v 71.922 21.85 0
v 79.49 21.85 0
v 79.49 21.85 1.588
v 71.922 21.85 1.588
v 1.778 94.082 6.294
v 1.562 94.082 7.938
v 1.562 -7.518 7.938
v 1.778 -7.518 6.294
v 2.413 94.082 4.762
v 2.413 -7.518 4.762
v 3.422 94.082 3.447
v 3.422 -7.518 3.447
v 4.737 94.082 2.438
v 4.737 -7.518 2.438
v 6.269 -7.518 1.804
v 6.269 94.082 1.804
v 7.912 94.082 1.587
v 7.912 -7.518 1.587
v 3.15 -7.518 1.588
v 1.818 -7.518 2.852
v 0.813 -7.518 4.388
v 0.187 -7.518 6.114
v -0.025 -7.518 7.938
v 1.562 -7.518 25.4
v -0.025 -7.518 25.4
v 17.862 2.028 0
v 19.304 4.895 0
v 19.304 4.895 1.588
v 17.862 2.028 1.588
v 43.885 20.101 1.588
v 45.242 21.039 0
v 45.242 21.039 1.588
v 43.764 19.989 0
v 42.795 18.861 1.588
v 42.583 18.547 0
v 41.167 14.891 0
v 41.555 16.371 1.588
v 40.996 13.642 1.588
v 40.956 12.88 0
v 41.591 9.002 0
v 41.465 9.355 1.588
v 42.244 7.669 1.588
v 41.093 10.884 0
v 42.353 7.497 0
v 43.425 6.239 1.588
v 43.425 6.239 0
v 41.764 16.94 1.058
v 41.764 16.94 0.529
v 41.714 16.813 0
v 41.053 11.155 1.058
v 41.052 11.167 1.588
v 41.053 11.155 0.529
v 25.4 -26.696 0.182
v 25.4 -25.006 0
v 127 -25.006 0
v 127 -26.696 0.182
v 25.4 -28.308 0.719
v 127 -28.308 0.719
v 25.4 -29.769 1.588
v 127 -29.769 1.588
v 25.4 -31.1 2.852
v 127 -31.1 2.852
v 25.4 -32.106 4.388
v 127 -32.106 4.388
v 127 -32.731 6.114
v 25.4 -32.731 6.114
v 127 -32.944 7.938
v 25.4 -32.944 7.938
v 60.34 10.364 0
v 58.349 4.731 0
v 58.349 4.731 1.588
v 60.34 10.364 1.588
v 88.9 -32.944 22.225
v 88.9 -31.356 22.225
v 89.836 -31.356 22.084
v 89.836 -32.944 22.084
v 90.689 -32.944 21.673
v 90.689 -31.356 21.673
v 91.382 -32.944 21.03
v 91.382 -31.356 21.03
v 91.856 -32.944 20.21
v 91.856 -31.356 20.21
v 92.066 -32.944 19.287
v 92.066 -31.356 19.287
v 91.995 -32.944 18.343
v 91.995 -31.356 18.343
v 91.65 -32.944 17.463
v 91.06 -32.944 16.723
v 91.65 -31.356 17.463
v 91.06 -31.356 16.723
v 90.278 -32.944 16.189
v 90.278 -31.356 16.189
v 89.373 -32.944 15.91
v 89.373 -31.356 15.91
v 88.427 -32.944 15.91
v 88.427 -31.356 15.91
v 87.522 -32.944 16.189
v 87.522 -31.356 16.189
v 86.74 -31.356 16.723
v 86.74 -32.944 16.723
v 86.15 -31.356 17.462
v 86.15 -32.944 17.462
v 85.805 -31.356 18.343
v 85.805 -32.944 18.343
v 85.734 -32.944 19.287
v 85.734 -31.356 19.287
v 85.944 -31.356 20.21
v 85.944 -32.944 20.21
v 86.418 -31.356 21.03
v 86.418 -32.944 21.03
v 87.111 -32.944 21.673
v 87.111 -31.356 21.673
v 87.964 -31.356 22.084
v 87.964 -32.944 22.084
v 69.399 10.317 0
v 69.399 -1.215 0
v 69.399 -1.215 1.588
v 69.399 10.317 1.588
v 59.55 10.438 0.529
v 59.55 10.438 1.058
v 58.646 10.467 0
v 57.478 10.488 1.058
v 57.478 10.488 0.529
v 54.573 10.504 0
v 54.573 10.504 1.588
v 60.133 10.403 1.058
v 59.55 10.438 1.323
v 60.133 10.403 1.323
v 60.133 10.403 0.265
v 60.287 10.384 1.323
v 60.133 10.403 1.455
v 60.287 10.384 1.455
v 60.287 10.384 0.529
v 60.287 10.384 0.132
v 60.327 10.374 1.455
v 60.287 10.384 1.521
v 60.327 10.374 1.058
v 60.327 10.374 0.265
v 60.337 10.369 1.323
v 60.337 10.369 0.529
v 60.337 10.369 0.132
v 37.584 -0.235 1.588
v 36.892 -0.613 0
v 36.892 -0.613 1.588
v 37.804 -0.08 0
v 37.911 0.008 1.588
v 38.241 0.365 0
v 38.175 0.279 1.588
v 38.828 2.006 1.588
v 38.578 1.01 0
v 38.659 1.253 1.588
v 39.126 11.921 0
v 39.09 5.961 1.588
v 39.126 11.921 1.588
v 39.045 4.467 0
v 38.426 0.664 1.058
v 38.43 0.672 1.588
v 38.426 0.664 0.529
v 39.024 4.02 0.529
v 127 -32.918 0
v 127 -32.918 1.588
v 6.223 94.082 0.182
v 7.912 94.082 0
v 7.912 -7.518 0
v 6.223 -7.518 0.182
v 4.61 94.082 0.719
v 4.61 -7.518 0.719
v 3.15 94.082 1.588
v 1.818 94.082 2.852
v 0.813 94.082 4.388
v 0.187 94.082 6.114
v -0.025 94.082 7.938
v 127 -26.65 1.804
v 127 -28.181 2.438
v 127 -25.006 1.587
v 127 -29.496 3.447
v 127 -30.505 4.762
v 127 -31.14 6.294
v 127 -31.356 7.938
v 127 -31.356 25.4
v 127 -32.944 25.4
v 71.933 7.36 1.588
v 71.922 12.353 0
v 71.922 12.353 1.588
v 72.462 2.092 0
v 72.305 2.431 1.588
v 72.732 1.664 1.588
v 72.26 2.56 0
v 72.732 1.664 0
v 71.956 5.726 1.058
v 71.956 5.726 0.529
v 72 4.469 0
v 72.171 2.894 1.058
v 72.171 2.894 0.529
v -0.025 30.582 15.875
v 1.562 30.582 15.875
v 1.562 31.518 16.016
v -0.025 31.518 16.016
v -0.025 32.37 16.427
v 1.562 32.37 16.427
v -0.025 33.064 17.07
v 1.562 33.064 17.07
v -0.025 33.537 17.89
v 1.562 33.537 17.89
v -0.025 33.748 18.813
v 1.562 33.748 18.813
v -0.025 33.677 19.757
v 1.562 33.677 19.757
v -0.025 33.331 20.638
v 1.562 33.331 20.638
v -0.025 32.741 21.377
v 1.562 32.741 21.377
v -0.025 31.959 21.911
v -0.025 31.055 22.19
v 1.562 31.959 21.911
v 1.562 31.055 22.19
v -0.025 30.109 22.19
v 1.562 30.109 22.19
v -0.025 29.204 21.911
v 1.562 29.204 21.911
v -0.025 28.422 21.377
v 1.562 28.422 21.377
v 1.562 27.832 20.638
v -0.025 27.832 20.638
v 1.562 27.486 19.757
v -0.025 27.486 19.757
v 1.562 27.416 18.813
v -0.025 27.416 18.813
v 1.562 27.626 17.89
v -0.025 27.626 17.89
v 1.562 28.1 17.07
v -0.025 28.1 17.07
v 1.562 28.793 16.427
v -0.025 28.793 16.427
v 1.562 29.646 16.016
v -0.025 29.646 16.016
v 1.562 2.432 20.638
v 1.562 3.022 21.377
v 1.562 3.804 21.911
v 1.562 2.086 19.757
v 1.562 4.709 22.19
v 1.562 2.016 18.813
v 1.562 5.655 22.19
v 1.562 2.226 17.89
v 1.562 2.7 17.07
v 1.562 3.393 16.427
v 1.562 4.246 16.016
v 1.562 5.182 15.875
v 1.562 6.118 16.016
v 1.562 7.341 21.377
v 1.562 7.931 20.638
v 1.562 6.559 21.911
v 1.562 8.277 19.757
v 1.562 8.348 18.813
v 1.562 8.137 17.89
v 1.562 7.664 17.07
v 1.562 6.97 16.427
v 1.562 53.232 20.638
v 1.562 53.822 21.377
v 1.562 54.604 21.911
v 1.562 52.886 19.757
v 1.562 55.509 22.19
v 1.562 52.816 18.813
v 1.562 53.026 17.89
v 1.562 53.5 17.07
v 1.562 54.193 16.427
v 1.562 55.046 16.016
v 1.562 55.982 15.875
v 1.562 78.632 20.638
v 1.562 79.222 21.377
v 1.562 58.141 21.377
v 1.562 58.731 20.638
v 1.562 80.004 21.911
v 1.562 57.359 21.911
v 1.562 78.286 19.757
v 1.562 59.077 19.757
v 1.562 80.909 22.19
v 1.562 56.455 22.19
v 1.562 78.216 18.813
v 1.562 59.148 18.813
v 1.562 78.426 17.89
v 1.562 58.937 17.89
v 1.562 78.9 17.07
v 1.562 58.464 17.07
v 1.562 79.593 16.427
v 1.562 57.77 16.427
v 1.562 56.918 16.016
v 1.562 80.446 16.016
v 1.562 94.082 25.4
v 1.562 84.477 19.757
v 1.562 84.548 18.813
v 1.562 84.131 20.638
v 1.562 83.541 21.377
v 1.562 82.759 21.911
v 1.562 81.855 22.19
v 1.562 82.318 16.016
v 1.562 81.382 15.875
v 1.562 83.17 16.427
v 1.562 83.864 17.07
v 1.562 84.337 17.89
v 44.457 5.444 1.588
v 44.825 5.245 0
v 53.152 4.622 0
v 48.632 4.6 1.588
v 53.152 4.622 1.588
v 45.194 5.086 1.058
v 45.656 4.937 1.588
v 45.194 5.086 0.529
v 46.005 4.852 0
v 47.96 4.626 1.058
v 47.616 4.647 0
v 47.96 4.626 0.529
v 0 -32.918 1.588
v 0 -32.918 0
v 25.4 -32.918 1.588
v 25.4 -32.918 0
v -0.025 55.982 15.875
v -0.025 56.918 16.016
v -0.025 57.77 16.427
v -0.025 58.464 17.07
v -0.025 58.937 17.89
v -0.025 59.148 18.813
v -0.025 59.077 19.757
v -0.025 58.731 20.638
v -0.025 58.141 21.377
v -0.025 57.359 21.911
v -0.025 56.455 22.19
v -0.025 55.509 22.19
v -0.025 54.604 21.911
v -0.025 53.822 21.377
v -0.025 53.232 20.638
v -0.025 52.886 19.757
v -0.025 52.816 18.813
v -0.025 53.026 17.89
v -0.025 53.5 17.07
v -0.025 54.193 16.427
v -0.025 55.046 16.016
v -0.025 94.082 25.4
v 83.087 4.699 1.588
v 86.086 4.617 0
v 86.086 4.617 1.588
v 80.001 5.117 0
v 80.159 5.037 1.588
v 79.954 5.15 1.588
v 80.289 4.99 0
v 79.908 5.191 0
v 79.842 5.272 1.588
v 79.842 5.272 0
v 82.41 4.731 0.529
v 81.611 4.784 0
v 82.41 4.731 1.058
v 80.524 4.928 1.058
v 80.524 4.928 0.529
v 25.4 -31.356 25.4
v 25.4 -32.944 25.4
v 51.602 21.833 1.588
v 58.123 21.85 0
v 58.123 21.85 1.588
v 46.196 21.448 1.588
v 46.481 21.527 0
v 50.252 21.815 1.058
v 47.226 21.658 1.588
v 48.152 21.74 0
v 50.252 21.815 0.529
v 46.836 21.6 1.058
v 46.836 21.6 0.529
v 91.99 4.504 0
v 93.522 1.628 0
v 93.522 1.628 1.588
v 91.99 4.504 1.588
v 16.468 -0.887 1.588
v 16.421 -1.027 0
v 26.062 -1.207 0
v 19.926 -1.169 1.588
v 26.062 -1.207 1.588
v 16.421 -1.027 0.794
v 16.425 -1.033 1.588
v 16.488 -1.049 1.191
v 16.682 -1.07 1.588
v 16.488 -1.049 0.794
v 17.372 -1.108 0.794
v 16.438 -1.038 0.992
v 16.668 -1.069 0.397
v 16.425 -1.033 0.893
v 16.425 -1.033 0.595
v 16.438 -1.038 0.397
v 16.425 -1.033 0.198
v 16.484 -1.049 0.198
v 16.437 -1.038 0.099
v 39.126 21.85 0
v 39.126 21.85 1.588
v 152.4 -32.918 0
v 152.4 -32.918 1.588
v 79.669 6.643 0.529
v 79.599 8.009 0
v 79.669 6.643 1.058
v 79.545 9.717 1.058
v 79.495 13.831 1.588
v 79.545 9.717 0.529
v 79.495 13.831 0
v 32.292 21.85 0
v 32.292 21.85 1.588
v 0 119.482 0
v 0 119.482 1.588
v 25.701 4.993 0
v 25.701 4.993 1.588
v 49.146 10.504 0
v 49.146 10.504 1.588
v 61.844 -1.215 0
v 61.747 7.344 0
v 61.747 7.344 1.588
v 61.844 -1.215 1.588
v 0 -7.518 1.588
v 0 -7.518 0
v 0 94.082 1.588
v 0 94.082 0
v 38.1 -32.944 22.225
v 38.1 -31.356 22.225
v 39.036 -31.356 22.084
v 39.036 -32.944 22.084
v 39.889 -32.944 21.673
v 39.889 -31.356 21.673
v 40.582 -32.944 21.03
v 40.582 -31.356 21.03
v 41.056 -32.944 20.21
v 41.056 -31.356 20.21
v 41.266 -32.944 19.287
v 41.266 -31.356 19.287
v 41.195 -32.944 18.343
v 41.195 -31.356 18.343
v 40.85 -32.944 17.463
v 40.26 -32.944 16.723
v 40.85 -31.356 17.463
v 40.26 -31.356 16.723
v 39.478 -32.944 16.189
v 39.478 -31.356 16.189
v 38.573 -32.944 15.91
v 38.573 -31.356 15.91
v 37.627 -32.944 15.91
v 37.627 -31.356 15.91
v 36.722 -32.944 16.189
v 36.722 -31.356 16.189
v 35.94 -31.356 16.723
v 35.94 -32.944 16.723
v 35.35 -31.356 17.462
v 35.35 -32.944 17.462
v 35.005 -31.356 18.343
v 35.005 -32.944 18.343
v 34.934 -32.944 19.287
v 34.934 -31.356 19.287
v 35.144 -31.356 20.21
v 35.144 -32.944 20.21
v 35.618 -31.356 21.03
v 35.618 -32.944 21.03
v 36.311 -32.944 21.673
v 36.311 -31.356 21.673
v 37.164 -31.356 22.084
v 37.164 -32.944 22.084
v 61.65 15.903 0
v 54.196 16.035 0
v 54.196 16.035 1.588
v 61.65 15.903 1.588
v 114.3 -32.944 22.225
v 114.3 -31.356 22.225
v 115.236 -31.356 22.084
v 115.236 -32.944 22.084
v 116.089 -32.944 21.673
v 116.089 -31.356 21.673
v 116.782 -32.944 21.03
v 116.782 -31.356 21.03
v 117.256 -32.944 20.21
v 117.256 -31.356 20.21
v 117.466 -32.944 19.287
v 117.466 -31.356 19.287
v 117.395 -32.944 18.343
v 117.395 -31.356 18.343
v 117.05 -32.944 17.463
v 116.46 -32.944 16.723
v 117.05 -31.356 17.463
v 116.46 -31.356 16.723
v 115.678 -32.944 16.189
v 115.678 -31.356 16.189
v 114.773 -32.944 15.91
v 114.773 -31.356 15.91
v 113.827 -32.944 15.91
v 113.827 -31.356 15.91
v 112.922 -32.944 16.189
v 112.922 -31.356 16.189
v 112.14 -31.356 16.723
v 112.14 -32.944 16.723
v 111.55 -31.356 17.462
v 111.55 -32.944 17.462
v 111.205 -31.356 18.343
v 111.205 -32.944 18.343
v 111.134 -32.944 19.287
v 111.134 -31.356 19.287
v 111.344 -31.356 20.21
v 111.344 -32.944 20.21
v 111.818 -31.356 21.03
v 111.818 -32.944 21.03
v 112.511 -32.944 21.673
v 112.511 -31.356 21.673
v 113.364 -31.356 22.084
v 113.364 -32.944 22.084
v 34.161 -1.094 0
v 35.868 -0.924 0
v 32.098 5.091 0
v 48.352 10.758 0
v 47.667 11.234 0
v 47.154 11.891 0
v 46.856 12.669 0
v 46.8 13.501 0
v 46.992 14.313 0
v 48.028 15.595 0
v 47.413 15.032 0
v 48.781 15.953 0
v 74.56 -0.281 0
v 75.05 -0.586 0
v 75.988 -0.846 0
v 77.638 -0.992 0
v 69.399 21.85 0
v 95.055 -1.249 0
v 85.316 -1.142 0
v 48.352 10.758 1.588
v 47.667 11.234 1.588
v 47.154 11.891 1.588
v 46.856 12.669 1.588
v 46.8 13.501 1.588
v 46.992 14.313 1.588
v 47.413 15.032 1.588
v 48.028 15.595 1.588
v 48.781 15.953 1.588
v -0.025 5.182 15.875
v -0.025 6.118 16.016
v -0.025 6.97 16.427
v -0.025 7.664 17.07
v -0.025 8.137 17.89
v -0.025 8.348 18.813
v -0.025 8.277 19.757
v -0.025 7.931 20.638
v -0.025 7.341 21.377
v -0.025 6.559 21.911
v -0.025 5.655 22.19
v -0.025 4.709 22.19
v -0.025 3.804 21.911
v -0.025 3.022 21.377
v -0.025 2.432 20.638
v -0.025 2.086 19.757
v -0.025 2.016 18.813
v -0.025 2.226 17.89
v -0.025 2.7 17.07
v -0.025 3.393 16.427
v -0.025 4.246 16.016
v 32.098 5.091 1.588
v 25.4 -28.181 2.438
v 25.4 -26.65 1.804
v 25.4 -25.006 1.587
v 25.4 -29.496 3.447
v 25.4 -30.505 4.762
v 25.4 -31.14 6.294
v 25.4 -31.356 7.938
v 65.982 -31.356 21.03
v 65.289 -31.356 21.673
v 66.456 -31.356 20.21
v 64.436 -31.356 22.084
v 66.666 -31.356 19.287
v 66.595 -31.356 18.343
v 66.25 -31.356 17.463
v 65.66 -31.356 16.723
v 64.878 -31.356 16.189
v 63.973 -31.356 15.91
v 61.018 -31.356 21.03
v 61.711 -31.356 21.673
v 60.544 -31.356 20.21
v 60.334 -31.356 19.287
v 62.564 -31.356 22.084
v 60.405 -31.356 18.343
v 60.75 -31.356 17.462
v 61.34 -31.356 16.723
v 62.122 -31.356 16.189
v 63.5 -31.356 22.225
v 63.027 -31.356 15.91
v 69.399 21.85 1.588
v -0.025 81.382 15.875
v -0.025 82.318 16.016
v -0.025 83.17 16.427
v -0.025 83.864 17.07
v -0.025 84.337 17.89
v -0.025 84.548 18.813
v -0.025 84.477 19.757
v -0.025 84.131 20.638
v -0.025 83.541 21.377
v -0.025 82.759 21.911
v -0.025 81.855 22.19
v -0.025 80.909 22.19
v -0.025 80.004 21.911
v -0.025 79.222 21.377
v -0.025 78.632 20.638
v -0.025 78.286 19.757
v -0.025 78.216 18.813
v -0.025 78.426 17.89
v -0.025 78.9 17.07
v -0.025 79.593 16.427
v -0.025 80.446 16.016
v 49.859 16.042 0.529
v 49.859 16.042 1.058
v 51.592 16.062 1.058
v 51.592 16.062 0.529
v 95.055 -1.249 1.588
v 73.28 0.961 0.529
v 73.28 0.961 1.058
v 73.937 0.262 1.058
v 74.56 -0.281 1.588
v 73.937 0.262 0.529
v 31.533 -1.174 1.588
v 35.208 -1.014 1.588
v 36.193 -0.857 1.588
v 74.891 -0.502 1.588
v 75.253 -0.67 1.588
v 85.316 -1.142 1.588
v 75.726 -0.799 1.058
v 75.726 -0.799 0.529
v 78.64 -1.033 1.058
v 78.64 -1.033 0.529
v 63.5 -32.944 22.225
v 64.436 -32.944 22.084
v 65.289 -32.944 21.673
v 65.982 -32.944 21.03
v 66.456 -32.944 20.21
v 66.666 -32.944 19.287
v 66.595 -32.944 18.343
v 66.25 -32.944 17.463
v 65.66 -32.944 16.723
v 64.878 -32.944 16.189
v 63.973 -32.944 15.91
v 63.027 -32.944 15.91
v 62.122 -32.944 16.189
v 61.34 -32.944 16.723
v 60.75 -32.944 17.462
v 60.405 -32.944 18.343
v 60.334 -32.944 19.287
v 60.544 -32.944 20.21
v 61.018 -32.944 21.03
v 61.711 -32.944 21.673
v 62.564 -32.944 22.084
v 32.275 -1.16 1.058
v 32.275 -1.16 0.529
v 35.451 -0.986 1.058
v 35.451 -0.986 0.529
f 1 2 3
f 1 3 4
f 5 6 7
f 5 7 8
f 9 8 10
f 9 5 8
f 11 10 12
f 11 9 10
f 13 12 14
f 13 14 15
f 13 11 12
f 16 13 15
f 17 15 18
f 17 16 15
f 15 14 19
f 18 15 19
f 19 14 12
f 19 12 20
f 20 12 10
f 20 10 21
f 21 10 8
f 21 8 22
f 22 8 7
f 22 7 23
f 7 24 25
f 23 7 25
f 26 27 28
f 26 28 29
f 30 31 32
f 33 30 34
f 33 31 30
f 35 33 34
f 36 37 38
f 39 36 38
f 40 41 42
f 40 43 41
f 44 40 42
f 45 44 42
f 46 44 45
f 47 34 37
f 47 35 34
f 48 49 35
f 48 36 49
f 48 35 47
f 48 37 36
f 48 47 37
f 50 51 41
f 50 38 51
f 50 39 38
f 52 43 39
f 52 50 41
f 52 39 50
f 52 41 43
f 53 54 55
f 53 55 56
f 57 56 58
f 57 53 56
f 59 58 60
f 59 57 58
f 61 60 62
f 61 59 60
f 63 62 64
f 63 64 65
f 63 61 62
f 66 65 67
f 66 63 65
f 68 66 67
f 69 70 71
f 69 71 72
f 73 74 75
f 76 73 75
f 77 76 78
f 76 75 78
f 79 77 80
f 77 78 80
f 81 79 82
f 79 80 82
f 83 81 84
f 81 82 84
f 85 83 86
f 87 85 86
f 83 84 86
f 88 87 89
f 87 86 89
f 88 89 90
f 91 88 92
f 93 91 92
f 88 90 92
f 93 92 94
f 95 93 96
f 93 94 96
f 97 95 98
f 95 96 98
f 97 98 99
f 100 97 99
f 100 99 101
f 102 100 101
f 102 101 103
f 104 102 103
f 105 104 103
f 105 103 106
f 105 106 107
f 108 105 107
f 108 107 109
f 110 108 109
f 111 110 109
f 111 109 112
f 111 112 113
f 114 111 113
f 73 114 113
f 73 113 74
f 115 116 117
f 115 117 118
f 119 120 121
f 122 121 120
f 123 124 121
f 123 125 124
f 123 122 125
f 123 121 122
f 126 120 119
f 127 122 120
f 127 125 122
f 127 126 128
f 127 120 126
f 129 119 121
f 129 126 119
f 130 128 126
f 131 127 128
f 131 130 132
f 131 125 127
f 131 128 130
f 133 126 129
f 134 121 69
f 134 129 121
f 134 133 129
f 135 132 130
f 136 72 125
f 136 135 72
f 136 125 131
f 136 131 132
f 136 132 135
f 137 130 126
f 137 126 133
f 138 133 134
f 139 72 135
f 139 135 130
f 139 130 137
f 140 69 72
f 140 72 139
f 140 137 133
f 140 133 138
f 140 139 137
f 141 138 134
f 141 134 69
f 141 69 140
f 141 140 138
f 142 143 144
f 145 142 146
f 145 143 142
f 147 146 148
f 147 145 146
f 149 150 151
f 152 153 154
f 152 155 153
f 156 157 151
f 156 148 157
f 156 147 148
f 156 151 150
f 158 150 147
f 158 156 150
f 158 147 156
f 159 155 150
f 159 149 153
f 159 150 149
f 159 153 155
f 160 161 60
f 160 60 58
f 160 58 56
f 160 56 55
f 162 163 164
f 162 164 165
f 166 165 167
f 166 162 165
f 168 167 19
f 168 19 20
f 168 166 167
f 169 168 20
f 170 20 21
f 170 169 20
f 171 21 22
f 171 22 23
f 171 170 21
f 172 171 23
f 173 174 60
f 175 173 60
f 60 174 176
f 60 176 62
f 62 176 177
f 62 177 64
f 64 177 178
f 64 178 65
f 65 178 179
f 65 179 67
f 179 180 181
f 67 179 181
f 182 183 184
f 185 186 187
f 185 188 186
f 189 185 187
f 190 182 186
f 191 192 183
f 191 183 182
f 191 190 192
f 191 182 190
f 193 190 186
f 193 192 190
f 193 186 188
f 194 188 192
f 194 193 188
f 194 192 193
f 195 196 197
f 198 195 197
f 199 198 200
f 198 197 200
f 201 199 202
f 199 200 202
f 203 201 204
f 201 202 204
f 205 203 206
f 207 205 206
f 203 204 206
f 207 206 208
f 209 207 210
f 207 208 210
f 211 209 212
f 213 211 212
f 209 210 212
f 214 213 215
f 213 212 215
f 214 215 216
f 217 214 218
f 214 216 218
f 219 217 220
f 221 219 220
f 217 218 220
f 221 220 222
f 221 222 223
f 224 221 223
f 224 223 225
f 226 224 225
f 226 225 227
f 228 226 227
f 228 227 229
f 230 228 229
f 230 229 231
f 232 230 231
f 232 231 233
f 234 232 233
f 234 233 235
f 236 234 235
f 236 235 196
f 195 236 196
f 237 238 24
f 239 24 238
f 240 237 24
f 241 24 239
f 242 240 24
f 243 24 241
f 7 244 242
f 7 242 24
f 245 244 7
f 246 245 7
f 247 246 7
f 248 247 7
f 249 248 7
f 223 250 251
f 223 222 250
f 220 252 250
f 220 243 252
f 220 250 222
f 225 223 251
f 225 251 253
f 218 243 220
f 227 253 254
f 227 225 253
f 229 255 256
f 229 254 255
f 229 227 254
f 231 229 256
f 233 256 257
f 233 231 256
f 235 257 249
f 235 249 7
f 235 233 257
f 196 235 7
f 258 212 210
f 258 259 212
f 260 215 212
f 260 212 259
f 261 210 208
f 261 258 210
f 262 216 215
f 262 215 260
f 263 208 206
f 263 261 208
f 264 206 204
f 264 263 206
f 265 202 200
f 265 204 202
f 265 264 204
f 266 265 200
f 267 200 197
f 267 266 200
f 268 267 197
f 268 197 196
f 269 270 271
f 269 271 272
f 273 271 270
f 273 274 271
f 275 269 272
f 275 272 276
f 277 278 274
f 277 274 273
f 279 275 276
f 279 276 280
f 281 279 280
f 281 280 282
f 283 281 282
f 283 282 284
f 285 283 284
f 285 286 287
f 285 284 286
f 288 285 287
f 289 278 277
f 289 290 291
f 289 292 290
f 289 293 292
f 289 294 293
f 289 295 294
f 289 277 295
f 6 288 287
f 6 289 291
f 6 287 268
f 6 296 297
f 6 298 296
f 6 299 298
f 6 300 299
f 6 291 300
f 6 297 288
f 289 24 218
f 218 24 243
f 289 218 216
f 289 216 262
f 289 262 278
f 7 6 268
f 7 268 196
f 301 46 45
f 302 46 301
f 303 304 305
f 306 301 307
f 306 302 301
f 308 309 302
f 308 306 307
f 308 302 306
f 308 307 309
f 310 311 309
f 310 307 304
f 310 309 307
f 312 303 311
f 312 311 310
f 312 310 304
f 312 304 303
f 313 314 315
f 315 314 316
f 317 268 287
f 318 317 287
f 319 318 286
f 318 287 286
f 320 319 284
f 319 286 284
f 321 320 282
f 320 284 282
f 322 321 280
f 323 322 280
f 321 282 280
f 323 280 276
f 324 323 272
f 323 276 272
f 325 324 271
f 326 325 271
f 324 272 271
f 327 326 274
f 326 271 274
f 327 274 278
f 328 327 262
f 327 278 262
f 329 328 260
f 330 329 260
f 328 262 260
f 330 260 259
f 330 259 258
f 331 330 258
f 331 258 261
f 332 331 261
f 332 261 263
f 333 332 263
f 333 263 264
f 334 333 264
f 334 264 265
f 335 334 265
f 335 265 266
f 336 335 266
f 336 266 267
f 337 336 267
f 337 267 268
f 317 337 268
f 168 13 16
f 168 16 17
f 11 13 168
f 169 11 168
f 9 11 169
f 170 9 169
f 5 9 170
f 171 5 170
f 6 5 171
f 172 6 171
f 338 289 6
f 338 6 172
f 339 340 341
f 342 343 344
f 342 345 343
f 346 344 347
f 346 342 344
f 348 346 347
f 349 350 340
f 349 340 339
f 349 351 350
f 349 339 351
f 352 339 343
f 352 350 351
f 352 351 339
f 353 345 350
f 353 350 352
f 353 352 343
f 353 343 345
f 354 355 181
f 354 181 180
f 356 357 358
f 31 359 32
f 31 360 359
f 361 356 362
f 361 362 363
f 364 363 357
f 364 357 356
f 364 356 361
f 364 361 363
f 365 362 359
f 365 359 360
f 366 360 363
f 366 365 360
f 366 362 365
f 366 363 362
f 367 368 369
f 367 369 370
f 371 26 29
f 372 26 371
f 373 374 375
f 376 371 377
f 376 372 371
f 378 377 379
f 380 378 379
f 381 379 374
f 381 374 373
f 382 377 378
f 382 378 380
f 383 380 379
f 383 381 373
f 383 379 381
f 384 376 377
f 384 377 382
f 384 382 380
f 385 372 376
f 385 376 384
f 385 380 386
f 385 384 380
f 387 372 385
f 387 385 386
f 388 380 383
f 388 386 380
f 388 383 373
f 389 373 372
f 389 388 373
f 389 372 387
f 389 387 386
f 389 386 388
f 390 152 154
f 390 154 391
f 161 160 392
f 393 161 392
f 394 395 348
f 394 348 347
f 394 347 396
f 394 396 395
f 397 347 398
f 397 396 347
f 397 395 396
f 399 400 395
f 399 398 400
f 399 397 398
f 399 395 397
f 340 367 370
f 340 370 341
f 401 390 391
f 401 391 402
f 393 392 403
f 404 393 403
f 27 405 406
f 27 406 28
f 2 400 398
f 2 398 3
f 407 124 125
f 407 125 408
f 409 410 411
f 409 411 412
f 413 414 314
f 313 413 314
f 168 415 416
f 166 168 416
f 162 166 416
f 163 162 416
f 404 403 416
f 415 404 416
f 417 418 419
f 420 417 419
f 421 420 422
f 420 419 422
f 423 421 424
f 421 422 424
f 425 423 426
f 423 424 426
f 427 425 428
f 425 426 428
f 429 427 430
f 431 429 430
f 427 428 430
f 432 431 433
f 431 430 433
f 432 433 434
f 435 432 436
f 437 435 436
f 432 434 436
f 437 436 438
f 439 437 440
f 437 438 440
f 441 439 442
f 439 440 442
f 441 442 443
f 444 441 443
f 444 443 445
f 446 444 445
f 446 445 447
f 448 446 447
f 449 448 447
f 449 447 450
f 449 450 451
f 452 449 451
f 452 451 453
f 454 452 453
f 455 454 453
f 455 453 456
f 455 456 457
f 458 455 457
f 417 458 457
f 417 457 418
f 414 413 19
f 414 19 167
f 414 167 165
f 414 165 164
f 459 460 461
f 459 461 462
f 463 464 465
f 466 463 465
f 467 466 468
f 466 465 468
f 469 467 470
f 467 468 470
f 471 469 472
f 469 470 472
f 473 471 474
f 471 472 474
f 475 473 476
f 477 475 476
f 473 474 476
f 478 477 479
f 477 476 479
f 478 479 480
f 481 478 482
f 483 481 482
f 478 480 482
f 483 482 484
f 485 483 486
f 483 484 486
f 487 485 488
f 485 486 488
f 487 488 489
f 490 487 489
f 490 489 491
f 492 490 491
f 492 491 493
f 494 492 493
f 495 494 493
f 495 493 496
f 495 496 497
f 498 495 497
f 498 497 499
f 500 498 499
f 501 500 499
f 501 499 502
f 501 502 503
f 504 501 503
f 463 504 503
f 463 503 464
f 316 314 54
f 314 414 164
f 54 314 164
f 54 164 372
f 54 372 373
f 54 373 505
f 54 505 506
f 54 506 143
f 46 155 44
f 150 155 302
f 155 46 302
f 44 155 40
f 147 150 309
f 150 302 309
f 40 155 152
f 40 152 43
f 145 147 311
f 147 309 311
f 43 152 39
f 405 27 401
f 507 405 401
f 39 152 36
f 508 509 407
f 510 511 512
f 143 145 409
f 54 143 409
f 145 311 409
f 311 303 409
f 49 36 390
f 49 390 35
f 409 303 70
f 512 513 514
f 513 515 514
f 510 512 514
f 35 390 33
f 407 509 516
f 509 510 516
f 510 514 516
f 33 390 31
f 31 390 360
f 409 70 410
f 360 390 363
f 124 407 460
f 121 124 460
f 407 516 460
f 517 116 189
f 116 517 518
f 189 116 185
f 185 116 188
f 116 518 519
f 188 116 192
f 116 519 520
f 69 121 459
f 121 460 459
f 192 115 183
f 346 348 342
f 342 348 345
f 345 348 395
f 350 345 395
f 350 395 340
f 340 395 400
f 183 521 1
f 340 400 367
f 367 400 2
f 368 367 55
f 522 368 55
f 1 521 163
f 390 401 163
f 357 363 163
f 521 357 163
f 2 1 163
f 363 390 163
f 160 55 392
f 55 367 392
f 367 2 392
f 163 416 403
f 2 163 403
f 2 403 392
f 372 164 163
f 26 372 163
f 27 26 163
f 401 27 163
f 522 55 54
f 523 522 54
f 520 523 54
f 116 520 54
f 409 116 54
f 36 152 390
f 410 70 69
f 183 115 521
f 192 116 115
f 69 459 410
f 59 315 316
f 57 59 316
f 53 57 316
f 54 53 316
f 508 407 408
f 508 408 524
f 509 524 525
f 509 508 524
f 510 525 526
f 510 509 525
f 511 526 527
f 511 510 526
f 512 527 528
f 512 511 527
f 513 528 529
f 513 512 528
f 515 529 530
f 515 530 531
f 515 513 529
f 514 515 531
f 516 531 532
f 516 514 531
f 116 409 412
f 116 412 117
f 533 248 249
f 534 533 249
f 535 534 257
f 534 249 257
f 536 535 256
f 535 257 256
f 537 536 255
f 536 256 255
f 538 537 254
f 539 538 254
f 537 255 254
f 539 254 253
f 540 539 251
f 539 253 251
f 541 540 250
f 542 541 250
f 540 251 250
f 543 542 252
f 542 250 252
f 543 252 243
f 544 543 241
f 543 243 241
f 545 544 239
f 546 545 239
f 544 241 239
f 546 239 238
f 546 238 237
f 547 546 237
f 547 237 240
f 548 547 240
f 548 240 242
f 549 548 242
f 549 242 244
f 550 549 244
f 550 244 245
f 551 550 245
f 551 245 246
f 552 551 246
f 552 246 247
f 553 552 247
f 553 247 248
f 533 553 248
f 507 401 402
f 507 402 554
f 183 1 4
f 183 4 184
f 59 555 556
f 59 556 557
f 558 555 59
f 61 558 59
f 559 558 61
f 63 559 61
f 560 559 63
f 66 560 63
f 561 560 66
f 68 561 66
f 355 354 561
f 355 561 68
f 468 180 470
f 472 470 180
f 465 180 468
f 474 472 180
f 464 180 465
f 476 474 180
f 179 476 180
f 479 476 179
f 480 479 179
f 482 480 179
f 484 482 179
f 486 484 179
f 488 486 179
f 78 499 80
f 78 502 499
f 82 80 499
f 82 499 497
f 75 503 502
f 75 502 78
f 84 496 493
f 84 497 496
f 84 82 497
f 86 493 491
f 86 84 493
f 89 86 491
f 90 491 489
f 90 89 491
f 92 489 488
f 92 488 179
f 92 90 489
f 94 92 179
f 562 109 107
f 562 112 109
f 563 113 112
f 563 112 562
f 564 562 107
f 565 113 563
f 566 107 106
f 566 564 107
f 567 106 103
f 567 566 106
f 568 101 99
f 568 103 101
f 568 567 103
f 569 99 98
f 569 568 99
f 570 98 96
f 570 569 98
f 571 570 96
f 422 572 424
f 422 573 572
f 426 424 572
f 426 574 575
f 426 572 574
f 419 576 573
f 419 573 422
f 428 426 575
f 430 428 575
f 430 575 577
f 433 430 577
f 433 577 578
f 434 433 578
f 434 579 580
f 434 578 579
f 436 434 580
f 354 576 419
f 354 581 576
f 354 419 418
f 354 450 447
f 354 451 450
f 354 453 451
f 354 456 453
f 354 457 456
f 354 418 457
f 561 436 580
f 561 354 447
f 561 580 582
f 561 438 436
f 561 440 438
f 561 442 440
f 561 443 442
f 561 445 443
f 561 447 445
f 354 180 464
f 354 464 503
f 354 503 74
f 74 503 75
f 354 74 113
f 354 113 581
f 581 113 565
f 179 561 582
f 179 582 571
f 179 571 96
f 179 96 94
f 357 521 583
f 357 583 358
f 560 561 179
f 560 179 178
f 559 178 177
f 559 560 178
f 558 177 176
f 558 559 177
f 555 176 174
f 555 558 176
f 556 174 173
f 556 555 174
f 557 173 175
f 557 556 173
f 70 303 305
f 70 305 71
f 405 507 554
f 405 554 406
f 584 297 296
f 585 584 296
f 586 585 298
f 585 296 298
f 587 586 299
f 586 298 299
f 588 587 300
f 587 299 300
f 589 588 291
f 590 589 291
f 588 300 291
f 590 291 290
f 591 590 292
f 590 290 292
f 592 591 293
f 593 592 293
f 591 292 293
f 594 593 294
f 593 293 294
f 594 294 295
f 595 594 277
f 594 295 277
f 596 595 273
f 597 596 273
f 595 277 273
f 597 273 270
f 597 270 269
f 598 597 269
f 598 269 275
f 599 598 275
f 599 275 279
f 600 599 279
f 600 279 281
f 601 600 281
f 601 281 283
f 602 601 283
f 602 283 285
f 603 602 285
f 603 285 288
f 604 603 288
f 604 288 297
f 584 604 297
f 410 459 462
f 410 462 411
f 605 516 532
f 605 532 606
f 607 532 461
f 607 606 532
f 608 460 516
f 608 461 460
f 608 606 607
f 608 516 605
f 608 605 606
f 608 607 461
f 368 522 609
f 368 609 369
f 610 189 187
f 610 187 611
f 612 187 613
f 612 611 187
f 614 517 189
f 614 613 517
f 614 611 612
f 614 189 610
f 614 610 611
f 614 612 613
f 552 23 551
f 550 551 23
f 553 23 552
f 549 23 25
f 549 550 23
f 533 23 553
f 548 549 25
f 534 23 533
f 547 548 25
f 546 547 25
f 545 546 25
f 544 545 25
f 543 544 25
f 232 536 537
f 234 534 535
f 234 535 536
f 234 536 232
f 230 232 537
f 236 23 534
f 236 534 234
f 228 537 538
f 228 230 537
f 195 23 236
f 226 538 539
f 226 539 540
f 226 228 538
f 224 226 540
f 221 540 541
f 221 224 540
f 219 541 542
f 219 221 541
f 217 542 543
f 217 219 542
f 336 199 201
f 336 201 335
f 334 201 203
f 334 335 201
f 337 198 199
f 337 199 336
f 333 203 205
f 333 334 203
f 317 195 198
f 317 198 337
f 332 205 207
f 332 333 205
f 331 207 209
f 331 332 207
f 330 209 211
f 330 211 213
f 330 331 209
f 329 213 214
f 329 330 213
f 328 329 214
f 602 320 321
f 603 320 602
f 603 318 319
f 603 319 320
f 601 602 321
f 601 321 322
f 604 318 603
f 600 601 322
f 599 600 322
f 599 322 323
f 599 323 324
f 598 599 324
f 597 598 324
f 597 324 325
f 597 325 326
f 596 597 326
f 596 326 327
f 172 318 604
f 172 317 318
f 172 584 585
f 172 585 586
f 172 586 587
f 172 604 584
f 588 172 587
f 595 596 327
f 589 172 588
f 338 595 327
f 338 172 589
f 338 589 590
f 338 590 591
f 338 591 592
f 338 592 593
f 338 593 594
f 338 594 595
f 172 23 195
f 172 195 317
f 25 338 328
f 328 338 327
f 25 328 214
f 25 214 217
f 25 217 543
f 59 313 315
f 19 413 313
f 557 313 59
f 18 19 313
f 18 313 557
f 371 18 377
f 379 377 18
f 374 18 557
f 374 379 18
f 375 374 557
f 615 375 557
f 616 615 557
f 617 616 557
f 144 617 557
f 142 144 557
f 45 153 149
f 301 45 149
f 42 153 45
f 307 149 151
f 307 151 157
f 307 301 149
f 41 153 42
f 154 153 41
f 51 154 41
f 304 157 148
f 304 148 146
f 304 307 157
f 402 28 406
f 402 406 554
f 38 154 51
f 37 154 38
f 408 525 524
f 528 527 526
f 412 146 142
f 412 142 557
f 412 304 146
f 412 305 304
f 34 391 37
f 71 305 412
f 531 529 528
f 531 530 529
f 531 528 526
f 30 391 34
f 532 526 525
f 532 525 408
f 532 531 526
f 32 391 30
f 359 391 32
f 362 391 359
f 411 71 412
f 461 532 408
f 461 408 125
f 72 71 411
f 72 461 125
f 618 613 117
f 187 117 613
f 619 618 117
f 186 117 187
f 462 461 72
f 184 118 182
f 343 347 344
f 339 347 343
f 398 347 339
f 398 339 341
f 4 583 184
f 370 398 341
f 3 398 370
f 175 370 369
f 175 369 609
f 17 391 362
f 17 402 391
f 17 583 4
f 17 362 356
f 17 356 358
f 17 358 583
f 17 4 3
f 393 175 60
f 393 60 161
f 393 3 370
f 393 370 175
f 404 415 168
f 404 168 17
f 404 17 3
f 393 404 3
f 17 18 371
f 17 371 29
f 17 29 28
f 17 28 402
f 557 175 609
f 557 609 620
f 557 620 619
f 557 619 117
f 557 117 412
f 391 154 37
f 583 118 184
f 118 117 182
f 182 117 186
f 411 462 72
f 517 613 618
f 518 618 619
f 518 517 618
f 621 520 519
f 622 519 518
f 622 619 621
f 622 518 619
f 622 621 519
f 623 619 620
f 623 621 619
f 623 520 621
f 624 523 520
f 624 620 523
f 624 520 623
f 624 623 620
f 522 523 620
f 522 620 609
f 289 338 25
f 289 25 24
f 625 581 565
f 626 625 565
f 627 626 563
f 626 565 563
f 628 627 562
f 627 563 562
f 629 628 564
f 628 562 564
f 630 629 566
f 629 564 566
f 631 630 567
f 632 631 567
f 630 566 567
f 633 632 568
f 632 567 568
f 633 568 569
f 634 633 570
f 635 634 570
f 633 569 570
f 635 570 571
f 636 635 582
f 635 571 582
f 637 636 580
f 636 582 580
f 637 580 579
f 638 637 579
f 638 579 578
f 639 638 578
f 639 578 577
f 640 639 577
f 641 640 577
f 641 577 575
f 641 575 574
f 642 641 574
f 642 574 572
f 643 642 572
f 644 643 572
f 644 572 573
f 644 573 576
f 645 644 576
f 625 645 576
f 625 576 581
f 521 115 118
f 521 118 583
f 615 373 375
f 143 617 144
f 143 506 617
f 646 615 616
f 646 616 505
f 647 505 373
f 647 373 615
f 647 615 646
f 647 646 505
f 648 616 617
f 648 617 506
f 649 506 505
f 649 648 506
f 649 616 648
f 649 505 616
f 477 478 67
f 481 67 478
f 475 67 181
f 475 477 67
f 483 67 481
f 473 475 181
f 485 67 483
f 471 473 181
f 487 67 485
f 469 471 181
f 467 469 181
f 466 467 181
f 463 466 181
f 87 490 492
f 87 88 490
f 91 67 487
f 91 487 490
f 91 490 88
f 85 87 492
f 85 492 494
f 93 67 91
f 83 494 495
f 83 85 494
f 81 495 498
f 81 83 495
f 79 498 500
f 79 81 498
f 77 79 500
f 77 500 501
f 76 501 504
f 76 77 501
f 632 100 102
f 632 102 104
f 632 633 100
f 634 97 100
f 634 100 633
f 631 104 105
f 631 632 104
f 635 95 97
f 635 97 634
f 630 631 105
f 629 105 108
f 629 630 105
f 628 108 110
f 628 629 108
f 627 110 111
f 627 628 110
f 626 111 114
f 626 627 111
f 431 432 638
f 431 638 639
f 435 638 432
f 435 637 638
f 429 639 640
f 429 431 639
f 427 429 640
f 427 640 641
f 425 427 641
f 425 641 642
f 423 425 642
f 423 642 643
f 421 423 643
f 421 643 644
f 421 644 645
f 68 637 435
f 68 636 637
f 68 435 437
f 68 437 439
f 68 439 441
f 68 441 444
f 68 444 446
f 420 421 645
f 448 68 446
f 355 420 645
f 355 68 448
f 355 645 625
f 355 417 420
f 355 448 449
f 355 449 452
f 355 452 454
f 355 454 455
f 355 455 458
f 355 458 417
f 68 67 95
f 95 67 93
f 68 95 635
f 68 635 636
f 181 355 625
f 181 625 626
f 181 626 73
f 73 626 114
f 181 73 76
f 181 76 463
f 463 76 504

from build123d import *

# Parameters (mm, degrees)
BOSS_EXTRUDE1_DEPTH          = 1.5875
SKETCH7_W                    = 1.5875
SKETCH7_H                    = 101.6
BOSS_EXTRUDE2_DEPTH          = 0.0254
EDGE_FLANGE1_STRIP_W         = 19.05
EDGE_FLANGE1_STRIP_H         = 1.5875
EDGE_FLANGE1_STRIP_CUT_DEPTH = 101.6
EDGE_FLANGE1_DEPTH           = 101.6
SKETCH11_W                   = 101.6
SKETCH11_H                   = 1.5875
BOSS_EXTRUDE3_DEPTH          = 0.0254
EDGE_FLANGE2_STRIP_W         = 19.05
EDGE_FLANGE2_STRIP_H         = 1.5875
EDGE_FLANGE2_STRIP_CUT_DEPTH = 101.6
EDGE_FLANGE2_DEPTH           = 101.6
SKETCH15_R                   = 3.175
CUT_EXTRUDE1_DEPTH           = 2.54
SKETCH16_R                   = 3.175
CUT_EXTRUDE2_DEPTH           = 2.54
CUT_EXTRUDE6_DEPTH           = 2.54


# Sheet-metal steps are written as plain solids
with BuildPart() as part:
    # Sketch1 → Boss-Extrude1 (new body)
    with BuildSketch(Plane.XY):
        Polygon((0, 119.481843199), (0, -32.918156801), (152.4, -32.918156801), align=None)
    extrude(amount=BOSS_EXTRUDE1_DEPTH)

    # Sketch7 → Boss-Extrude2 (add)
    with BuildSketch(Plane.ZY):
        with Locations((0.79375, 43.281843199)):
            Rectangle(SKETCH7_W, SKETCH7_H)
    extrude(amount=BOSS_EXTRUDE2_DEPTH)

    # Edge-Flange1 strip (across the edge) → Edge-Flange1 strip cut (cut)
    with BuildSketch(Plane(origin=(-0.0254, 94.081843199, 1.5875), x_dir=(1, 0, 0), z_dir=(0, -1, 0))):
        with Locations((-1.5875, -0.79375)):
            Rectangle(EDGE_FLANGE1_STRIP_W, EDGE_FLANGE1_STRIP_H)
    extrude(amount=EDGE_FLANGE1_STRIP_CUT_DEPTH, mode=Mode.SUBTRACT)

    # Edge-Flange1 section (across the edge) → Edge-Flange1 (add)
    with BuildSketch(Plane(origin=(-0.0254, 94.081843199, 1.5875), x_dir=(1, 0, 0), z_dir=(0, -1, 0))):
        with BuildLine():
            Line((0, 6.35), (0, 23.8125))
            Line((0, 23.8125), (1.5875, 23.8125))
            Line((1.5875, 23.8125), (1.5875, 6.35))
            ThreePointArc((1.5875, 6.35), (3.447371939, 1.859871939), (7.9375, 0))
            Line((7.9375, 0), (7.9375, -1.5875))
            ThreePointArc((7.9375, -1.5875), (2.324839924, 0.737339924), (0, 6.35))
        make_face()
    extrude(amount=EDGE_FLANGE1_DEPTH)

    # Sketch11 → Boss-Extrude3 (add)
    with BuildSketch(Plane(origin=(0, -32.918156801, 0), x_dir=(-1, 0, 0), z_dir=(0, -1, 0))):
        with Locations((-76.2, -0.79375)):
            Rectangle(SKETCH11_W, SKETCH11_H)
    extrude(amount=BOSS_EXTRUDE3_DEPTH)

    # Edge-Flange2 strip (across the edge) → Edge-Flange2 strip cut (cut)
    with BuildSketch(Plane(origin=(25.4, -32.943556801, 1.5875), x_dir=(0, 1, 0), z_dir=(1, 0, 0))):
        with Locations((-1.5875, -0.79375)):
            Rectangle(EDGE_FLANGE2_STRIP_W, EDGE_FLANGE2_STRIP_H)
    extrude(amount=EDGE_FLANGE2_STRIP_CUT_DEPTH, mode=Mode.SUBTRACT)

    # Edge-Flange2 section (across the edge) → Edge-Flange2 (add)
    with BuildSketch(Plane(origin=(25.4, -32.943556801, 1.5875), x_dir=(0, 1, 0), z_dir=(1, 0, 0))):
        with BuildLine():
            Line((0, 6.35), (0, 23.8125))
            Line((0, 23.8125), (1.5875, 23.8125))
            Line((1.5875, 23.8125), (1.5875, 6.35))
            ThreePointArc((1.5875, 6.35), (3.447371939, 1.859871939), (7.9375, 0))
            Line((7.9375, 0), (7.9375, -1.5875))
            ThreePointArc((7.9375, -1.5875), (2.324839924, 0.737339924), (0, 6.35))
        make_face()
    extrude(amount=EDGE_FLANGE2_DEPTH)

    # Sketch15 → Cut-Extrude1 (cut)
    with BuildSketch(Plane(origin=(0, -31.356056801, 0), x_dir=(1, 0, 0), z_dir=(0, 1, 0))):
        with Locations(Location((38.1, -19.05, 0), (0, 0, 270))):
            Circle(SKETCH15_R)
        with Locations(Location((63.5, -19.05, 0), (0, 0, 270))):
            Circle(SKETCH15_R)
        with Locations(Location((88.9, -19.05, 0), (0, 0, 270))):
            Circle(SKETCH15_R)
        with Locations(Location((114.3, -19.05, 0), (0, 0, 270))):
            Circle(SKETCH15_R)
    extrude(amount=-CUT_EXTRUDE1_DEPTH, mode=Mode.SUBTRACT)

    # Sketch16 → Cut-Extrude2 (cut)
    with BuildSketch(Plane(origin=(1.5621, 0, 0), x_dir=(0, 0, -1), z_dir=(1, 0, 0))):
        with Locations((-19.05, 81.381843199)):
            Circle(SKETCH16_R)
        with Locations((-19.05, 55.981843199)):
            Circle(SKETCH16_R)
        with Locations((-19.05, 30.581843199)):
            Circle(SKETCH16_R)
        with Locations((-19.05, 5.181843199)):
            Circle(SKETCH16_R)
    extrude(amount=-CUT_EXTRUDE2_DEPTH, mode=Mode.SUBTRACT)

    # Sketch23 → Cut-Extrude6 (cut)
    with BuildSketch(Plane(origin=(0, 0, 0), x_dir=(-1, 0, 0), z_dir=(0, 0, -1))):
        with BuildLine():
            Line((-54.573395113, 10.50380224), (-49.145810825, 10.50380224))
            ThreePointArc((-49.145810825, 10.50380224), (-46.796706145, 13.083281254), (-48.781433081, 15.952577991))
            add(Edge.make_bspline(
                [(-48.781433081, 15.952577991), (-49.604210691, 16.082970195), (-51.083841149, 16.078342253), (-54.195922097, 16.035293361)],
                knots=[0.430340986, 0.430340986, 0.430340986, 0.430340986, 1, 1, 1, 1], degree=3))
            Line((-54.195922097, 16.035293361), (-61.650359925, 15.903259941))
            Line((-61.650359925, 15.903259941), (-61.746981527, 7.343931221))
            Line((-61.746981527, 7.343931221), (-61.843602617, -1.215397719))
            Line((-61.843602617, -1.215397719), (-65.621203901, -1.215397719))
            Line((-65.621203901, -1.215397719), (-69.398804677, -1.215397719))
            Line((-69.398804677, -1.215397719), (-69.398822965, 10.317171545))
            Line((-69.398822965, 10.317171545), (-69.398822965, 21.849740809))
            Line((-69.398822965, 21.849740809), (-58.122813005, 21.849740809))
            add(Edge.make_bspline(
                [(-58.122813005, 21.849740809), (-47.145028509, 21.849740809), (-46.804351517, 21.828297113), (-45.241678493, 21.038856985)],
                knots=[0, 0, 0, 0, 1, 1, 1, 1], degree=3))
            add(Edge.make_bspline(
                [(-45.241678493, 21.038856985), (-40.484510461, 18.635606521), (-39.407981245, 9.867736325), (-43.424538109, 6.239017141)],
                knots=[0, 0, 0, 0, 1, 1, 1, 1], degree=3))
            add(Edge.make_bspline(
                [(-43.424538109, 6.239017141), (-45.171541981, 4.660705845), (-46.271260381, 4.477914745), (-53.152055357, 4.622150677)],
                knots=[0, 0, 0, 0, 1, 1, 1, 1], degree=3))
            Line((-53.152055357, 4.622150677), (-58.348663709, 4.731083149))
            Line((-58.348663709, 4.731083149), (-60.339924976, 10.364052271))
            add(Edge.make_bspline(
                [(-60.339924976, 10.364052271), (-60.339785544, 10.446289733), (-57.744845223, 10.50917935), (-54.573395113, 10.50380224)],
                knots=[0, 0, 0, 0, 1, 1, 1, 1], degree=3))
        make_face()
        with BuildLine():
            Line((-93.522388131, 1.627502866), (-91.989800897, 4.503859321))
            Line((-91.989800897, 4.503859321), (-86.086398429, 4.617469457))
            add(Edge.make_bspline(
                [(-86.086398429, 4.617469457), (-81.318957113, 4.709221877), (-80.117365409, 4.835103769), (-79.841927301, 5.271672365)],
                knots=[0, 0, 0, 0, 1, 1, 1, 1], degree=3))
            add(Edge.make_bspline(
                [(-79.841927301, 5.271672365), (-79.654305121, 5.569050485), (-79.498376553, 9.419876413), (-79.495340745, 13.831000941)],
                knots=[0, 0, 0, 0, 1, 1, 1, 1], degree=3))
            Line((-79.495340745, 13.831000941), (-79.489821833, 21.849740809))
            Line((-79.489821833, 21.849740809), (-75.705697829, 21.849740809))
            Line((-75.705697829, 21.849740809), (-71.921573317, 21.849740809))
            Line((-71.921573317, 21.849740809), (-71.921573317, 12.352626453))
            add(Edge.make_bspline(
                [(-71.921573317, 12.352626453), (-71.921573317, 3.097047809), (-71.942194053, 2.825210913), (-72.732457141, 1.664079377)],
                knots=[0, 0, 0, 0, 1, 1, 1, 1], degree=3))
            add(Edge.make_bspline(
                [(-72.732457141, 1.664079377), (-73.178443041, 1.008787825), (-74.000851861, 0.133375809), (-74.560031337, -0.281281223)],
                knots=[0, 0, 0, 0, 1, 1, 1, 1], degree=3))
            add(Edge.make_bspline(
                [(-74.560031337, -0.281281223), (-75.523356309, -0.995630315), (-76.087920585, -1.040808787), (-85.315848789, -1.142028803)],
                knots=[0, 0, 0, 0, 1, 1, 1, 1], degree=3))
            Line((-85.315848789, -1.142028803), (-95.054974853, -1.248853075))
            Line((-95.054974853, -1.248853075), (-93.522388131, 1.627502866))
        make_face()
        with BuildLine():
            Line((-39.125829917, 11.921041845), (-39.125829917, 21.849740809))
            Line((-39.125829917, 21.849740809), (-35.708737437, 21.849740809))
            Line((-35.708737437, 21.849740809), (-32.291649021, 21.849740809))
            Line((-32.291649021, 21.849740809), (-32.194909565, 13.470608469))
            Line((-32.194909565, 13.470608469), (-32.098170109, 5.091476129))
            Line((-32.098170109, 5.091476129), (-25.701039901, 4.993059765))
            Line((-25.701039901, 4.993059765), (-19.303905629, 4.894643909))
            Line((-19.303905629, 4.894643909), (-17.862494237, 2.027820585))
            add(Edge.make_bspline(
                [(-17.862494237, 2.027820585), (-17.069717565, 0.451065801), (-16.421082845, -0.923695483), (-16.421082845, -1.027204039)],
                knots=[0, 0, 0, 0, 1, 1, 1, 1], degree=3))
            add(Edge.make_bspline(
                [(-16.421082845, -1.027204039), (-16.421082845, -1.130712595), (-20.759309373, -1.211707099), (-26.061589853, -1.207191487)],
                knots=[0, 0, 0, 0, 1, 1, 1, 1], degree=3))
            add(Edge.make_bspline(
                [(-26.061589853, -1.207191487), (-34.226807965, -1.200233919), (-35.884200637, -1.109240451), (-36.892080765, -0.612529227)],
                knots=[0, 0, 0, 0, 1, 1, 1, 1], degree=3))
            add(Edge.make_bspline(
                [(-36.892080765, -0.612529227), (-39.040522493, 0.446283489), (-39.125829917, 0.924935313), (-39.125829917, 11.921041845)],
                knots=[0, 0, 0, 0, 1, 1, 1, 1], degree=3))
        make_face()
    extrude(amount=-CUT_EXTRUDE6_DEPTH, mode=Mode.SUBTRACT)


solid = part.part
